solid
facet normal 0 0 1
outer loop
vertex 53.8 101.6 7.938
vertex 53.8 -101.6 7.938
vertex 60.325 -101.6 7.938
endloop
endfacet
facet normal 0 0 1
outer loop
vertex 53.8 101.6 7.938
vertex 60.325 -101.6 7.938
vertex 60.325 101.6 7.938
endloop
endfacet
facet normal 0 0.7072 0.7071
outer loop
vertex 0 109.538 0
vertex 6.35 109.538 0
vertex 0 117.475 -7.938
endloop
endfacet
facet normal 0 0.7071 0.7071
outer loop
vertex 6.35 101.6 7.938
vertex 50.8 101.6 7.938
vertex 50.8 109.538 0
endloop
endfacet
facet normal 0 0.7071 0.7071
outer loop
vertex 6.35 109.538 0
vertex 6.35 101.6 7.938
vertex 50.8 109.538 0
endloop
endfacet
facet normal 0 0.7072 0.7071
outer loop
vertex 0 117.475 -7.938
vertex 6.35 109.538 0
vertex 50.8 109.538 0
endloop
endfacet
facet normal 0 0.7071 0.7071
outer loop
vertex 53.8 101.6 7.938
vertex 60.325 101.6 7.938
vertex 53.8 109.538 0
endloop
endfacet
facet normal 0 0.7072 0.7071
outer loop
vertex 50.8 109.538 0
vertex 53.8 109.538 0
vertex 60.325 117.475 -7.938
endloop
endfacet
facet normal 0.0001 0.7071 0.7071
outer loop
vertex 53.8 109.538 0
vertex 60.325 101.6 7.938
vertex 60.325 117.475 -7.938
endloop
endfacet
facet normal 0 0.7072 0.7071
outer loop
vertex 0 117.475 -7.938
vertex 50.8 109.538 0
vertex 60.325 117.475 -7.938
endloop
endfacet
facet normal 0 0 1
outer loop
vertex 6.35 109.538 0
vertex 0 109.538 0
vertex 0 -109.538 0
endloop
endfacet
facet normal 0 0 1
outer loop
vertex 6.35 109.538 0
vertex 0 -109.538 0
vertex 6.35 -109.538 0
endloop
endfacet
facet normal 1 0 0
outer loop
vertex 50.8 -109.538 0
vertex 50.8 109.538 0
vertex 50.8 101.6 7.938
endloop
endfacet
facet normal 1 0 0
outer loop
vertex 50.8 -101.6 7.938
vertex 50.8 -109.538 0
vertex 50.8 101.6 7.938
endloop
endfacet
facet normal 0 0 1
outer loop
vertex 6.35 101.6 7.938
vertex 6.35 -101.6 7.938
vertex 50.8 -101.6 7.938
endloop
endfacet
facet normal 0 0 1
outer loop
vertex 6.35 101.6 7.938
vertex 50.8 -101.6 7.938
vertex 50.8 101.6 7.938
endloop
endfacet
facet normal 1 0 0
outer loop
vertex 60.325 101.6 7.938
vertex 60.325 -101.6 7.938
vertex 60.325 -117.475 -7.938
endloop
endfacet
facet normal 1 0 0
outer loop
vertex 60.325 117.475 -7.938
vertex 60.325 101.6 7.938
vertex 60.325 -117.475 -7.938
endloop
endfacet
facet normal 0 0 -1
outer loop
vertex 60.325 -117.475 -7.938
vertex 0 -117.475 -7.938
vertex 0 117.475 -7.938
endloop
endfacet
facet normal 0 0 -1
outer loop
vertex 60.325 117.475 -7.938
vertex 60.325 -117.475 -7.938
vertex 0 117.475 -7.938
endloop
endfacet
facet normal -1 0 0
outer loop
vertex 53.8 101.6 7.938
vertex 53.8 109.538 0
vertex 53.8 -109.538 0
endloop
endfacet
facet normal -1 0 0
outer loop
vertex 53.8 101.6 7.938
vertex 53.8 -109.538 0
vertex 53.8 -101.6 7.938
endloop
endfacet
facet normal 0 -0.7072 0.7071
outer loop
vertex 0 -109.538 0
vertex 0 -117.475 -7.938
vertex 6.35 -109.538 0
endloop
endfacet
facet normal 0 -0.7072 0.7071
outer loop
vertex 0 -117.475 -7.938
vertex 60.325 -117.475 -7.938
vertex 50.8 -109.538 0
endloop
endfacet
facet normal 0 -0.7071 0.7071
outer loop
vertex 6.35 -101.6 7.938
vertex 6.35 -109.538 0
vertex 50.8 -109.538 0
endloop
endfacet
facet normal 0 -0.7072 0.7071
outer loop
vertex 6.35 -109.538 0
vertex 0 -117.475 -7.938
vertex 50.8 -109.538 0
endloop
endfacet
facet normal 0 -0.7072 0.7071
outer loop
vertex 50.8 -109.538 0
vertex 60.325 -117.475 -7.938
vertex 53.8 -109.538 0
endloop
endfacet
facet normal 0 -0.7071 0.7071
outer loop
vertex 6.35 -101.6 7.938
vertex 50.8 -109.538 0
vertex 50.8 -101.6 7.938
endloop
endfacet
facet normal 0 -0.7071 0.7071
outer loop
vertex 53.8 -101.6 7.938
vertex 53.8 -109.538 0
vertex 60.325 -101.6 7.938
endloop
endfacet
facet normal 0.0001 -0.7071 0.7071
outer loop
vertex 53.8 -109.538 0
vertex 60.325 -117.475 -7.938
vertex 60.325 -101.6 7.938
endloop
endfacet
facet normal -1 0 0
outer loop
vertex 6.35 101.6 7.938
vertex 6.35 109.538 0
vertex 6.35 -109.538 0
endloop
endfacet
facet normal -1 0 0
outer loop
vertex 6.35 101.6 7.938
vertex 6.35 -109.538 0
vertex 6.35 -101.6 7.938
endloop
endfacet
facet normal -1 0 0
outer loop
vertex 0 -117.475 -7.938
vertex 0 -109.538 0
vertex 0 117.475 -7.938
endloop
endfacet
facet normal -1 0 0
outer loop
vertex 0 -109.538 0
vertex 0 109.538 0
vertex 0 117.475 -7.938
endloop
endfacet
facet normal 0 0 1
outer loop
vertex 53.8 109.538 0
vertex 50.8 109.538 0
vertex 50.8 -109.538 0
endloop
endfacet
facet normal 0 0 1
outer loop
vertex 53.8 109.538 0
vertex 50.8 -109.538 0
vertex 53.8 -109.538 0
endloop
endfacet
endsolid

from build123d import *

# Parameters (mm, degrees)
F0_W     = 234.95
F0_H     = 15.875
F1_DEPTH = 60.325
F2_W     = 6.35
F2_H     = 7.9375
F2_W_2   = 3
F3_DEPTH = 234.951
F5_DEPTH = 60.326


with BuildPart() as f1:
    # F0 (on Right) → F1 (new body)
    with BuildSketch(Plane.YZ):
        Rectangle(F0_W, F0_H)
    extrude(amount=F1_DEPTH)

    # F2 (on face) → F3 (cut, through all)
    with BuildSketch(Plane.XZ.offset(117.475)):
        with Locations((3.175, 3.96875)):
            Rectangle(F2_W, F2_H)
        with Locations((52.3, 3.96875)):
            Rectangle(F2_W_2, F2_H)
    extrude(amount=-F3_DEPTH, mode=Mode.SUBTRACT)

    # F4 (on face) → F5 (cut, through all)
    with BuildSketch(Plane.YZ.offset(60.325)):
        Polygon((-117.475, 7.9375), (-117.475, -7.9375), (-101.6, 7.9375), align=None)
        Polygon((101.6, 7.9375), (117.475, -7.9375), (117.475, 7.9375), align=None)
    extrude(amount=-F5_DEPTH, mode=Mode.SUBTRACT)


solid = f1.part
